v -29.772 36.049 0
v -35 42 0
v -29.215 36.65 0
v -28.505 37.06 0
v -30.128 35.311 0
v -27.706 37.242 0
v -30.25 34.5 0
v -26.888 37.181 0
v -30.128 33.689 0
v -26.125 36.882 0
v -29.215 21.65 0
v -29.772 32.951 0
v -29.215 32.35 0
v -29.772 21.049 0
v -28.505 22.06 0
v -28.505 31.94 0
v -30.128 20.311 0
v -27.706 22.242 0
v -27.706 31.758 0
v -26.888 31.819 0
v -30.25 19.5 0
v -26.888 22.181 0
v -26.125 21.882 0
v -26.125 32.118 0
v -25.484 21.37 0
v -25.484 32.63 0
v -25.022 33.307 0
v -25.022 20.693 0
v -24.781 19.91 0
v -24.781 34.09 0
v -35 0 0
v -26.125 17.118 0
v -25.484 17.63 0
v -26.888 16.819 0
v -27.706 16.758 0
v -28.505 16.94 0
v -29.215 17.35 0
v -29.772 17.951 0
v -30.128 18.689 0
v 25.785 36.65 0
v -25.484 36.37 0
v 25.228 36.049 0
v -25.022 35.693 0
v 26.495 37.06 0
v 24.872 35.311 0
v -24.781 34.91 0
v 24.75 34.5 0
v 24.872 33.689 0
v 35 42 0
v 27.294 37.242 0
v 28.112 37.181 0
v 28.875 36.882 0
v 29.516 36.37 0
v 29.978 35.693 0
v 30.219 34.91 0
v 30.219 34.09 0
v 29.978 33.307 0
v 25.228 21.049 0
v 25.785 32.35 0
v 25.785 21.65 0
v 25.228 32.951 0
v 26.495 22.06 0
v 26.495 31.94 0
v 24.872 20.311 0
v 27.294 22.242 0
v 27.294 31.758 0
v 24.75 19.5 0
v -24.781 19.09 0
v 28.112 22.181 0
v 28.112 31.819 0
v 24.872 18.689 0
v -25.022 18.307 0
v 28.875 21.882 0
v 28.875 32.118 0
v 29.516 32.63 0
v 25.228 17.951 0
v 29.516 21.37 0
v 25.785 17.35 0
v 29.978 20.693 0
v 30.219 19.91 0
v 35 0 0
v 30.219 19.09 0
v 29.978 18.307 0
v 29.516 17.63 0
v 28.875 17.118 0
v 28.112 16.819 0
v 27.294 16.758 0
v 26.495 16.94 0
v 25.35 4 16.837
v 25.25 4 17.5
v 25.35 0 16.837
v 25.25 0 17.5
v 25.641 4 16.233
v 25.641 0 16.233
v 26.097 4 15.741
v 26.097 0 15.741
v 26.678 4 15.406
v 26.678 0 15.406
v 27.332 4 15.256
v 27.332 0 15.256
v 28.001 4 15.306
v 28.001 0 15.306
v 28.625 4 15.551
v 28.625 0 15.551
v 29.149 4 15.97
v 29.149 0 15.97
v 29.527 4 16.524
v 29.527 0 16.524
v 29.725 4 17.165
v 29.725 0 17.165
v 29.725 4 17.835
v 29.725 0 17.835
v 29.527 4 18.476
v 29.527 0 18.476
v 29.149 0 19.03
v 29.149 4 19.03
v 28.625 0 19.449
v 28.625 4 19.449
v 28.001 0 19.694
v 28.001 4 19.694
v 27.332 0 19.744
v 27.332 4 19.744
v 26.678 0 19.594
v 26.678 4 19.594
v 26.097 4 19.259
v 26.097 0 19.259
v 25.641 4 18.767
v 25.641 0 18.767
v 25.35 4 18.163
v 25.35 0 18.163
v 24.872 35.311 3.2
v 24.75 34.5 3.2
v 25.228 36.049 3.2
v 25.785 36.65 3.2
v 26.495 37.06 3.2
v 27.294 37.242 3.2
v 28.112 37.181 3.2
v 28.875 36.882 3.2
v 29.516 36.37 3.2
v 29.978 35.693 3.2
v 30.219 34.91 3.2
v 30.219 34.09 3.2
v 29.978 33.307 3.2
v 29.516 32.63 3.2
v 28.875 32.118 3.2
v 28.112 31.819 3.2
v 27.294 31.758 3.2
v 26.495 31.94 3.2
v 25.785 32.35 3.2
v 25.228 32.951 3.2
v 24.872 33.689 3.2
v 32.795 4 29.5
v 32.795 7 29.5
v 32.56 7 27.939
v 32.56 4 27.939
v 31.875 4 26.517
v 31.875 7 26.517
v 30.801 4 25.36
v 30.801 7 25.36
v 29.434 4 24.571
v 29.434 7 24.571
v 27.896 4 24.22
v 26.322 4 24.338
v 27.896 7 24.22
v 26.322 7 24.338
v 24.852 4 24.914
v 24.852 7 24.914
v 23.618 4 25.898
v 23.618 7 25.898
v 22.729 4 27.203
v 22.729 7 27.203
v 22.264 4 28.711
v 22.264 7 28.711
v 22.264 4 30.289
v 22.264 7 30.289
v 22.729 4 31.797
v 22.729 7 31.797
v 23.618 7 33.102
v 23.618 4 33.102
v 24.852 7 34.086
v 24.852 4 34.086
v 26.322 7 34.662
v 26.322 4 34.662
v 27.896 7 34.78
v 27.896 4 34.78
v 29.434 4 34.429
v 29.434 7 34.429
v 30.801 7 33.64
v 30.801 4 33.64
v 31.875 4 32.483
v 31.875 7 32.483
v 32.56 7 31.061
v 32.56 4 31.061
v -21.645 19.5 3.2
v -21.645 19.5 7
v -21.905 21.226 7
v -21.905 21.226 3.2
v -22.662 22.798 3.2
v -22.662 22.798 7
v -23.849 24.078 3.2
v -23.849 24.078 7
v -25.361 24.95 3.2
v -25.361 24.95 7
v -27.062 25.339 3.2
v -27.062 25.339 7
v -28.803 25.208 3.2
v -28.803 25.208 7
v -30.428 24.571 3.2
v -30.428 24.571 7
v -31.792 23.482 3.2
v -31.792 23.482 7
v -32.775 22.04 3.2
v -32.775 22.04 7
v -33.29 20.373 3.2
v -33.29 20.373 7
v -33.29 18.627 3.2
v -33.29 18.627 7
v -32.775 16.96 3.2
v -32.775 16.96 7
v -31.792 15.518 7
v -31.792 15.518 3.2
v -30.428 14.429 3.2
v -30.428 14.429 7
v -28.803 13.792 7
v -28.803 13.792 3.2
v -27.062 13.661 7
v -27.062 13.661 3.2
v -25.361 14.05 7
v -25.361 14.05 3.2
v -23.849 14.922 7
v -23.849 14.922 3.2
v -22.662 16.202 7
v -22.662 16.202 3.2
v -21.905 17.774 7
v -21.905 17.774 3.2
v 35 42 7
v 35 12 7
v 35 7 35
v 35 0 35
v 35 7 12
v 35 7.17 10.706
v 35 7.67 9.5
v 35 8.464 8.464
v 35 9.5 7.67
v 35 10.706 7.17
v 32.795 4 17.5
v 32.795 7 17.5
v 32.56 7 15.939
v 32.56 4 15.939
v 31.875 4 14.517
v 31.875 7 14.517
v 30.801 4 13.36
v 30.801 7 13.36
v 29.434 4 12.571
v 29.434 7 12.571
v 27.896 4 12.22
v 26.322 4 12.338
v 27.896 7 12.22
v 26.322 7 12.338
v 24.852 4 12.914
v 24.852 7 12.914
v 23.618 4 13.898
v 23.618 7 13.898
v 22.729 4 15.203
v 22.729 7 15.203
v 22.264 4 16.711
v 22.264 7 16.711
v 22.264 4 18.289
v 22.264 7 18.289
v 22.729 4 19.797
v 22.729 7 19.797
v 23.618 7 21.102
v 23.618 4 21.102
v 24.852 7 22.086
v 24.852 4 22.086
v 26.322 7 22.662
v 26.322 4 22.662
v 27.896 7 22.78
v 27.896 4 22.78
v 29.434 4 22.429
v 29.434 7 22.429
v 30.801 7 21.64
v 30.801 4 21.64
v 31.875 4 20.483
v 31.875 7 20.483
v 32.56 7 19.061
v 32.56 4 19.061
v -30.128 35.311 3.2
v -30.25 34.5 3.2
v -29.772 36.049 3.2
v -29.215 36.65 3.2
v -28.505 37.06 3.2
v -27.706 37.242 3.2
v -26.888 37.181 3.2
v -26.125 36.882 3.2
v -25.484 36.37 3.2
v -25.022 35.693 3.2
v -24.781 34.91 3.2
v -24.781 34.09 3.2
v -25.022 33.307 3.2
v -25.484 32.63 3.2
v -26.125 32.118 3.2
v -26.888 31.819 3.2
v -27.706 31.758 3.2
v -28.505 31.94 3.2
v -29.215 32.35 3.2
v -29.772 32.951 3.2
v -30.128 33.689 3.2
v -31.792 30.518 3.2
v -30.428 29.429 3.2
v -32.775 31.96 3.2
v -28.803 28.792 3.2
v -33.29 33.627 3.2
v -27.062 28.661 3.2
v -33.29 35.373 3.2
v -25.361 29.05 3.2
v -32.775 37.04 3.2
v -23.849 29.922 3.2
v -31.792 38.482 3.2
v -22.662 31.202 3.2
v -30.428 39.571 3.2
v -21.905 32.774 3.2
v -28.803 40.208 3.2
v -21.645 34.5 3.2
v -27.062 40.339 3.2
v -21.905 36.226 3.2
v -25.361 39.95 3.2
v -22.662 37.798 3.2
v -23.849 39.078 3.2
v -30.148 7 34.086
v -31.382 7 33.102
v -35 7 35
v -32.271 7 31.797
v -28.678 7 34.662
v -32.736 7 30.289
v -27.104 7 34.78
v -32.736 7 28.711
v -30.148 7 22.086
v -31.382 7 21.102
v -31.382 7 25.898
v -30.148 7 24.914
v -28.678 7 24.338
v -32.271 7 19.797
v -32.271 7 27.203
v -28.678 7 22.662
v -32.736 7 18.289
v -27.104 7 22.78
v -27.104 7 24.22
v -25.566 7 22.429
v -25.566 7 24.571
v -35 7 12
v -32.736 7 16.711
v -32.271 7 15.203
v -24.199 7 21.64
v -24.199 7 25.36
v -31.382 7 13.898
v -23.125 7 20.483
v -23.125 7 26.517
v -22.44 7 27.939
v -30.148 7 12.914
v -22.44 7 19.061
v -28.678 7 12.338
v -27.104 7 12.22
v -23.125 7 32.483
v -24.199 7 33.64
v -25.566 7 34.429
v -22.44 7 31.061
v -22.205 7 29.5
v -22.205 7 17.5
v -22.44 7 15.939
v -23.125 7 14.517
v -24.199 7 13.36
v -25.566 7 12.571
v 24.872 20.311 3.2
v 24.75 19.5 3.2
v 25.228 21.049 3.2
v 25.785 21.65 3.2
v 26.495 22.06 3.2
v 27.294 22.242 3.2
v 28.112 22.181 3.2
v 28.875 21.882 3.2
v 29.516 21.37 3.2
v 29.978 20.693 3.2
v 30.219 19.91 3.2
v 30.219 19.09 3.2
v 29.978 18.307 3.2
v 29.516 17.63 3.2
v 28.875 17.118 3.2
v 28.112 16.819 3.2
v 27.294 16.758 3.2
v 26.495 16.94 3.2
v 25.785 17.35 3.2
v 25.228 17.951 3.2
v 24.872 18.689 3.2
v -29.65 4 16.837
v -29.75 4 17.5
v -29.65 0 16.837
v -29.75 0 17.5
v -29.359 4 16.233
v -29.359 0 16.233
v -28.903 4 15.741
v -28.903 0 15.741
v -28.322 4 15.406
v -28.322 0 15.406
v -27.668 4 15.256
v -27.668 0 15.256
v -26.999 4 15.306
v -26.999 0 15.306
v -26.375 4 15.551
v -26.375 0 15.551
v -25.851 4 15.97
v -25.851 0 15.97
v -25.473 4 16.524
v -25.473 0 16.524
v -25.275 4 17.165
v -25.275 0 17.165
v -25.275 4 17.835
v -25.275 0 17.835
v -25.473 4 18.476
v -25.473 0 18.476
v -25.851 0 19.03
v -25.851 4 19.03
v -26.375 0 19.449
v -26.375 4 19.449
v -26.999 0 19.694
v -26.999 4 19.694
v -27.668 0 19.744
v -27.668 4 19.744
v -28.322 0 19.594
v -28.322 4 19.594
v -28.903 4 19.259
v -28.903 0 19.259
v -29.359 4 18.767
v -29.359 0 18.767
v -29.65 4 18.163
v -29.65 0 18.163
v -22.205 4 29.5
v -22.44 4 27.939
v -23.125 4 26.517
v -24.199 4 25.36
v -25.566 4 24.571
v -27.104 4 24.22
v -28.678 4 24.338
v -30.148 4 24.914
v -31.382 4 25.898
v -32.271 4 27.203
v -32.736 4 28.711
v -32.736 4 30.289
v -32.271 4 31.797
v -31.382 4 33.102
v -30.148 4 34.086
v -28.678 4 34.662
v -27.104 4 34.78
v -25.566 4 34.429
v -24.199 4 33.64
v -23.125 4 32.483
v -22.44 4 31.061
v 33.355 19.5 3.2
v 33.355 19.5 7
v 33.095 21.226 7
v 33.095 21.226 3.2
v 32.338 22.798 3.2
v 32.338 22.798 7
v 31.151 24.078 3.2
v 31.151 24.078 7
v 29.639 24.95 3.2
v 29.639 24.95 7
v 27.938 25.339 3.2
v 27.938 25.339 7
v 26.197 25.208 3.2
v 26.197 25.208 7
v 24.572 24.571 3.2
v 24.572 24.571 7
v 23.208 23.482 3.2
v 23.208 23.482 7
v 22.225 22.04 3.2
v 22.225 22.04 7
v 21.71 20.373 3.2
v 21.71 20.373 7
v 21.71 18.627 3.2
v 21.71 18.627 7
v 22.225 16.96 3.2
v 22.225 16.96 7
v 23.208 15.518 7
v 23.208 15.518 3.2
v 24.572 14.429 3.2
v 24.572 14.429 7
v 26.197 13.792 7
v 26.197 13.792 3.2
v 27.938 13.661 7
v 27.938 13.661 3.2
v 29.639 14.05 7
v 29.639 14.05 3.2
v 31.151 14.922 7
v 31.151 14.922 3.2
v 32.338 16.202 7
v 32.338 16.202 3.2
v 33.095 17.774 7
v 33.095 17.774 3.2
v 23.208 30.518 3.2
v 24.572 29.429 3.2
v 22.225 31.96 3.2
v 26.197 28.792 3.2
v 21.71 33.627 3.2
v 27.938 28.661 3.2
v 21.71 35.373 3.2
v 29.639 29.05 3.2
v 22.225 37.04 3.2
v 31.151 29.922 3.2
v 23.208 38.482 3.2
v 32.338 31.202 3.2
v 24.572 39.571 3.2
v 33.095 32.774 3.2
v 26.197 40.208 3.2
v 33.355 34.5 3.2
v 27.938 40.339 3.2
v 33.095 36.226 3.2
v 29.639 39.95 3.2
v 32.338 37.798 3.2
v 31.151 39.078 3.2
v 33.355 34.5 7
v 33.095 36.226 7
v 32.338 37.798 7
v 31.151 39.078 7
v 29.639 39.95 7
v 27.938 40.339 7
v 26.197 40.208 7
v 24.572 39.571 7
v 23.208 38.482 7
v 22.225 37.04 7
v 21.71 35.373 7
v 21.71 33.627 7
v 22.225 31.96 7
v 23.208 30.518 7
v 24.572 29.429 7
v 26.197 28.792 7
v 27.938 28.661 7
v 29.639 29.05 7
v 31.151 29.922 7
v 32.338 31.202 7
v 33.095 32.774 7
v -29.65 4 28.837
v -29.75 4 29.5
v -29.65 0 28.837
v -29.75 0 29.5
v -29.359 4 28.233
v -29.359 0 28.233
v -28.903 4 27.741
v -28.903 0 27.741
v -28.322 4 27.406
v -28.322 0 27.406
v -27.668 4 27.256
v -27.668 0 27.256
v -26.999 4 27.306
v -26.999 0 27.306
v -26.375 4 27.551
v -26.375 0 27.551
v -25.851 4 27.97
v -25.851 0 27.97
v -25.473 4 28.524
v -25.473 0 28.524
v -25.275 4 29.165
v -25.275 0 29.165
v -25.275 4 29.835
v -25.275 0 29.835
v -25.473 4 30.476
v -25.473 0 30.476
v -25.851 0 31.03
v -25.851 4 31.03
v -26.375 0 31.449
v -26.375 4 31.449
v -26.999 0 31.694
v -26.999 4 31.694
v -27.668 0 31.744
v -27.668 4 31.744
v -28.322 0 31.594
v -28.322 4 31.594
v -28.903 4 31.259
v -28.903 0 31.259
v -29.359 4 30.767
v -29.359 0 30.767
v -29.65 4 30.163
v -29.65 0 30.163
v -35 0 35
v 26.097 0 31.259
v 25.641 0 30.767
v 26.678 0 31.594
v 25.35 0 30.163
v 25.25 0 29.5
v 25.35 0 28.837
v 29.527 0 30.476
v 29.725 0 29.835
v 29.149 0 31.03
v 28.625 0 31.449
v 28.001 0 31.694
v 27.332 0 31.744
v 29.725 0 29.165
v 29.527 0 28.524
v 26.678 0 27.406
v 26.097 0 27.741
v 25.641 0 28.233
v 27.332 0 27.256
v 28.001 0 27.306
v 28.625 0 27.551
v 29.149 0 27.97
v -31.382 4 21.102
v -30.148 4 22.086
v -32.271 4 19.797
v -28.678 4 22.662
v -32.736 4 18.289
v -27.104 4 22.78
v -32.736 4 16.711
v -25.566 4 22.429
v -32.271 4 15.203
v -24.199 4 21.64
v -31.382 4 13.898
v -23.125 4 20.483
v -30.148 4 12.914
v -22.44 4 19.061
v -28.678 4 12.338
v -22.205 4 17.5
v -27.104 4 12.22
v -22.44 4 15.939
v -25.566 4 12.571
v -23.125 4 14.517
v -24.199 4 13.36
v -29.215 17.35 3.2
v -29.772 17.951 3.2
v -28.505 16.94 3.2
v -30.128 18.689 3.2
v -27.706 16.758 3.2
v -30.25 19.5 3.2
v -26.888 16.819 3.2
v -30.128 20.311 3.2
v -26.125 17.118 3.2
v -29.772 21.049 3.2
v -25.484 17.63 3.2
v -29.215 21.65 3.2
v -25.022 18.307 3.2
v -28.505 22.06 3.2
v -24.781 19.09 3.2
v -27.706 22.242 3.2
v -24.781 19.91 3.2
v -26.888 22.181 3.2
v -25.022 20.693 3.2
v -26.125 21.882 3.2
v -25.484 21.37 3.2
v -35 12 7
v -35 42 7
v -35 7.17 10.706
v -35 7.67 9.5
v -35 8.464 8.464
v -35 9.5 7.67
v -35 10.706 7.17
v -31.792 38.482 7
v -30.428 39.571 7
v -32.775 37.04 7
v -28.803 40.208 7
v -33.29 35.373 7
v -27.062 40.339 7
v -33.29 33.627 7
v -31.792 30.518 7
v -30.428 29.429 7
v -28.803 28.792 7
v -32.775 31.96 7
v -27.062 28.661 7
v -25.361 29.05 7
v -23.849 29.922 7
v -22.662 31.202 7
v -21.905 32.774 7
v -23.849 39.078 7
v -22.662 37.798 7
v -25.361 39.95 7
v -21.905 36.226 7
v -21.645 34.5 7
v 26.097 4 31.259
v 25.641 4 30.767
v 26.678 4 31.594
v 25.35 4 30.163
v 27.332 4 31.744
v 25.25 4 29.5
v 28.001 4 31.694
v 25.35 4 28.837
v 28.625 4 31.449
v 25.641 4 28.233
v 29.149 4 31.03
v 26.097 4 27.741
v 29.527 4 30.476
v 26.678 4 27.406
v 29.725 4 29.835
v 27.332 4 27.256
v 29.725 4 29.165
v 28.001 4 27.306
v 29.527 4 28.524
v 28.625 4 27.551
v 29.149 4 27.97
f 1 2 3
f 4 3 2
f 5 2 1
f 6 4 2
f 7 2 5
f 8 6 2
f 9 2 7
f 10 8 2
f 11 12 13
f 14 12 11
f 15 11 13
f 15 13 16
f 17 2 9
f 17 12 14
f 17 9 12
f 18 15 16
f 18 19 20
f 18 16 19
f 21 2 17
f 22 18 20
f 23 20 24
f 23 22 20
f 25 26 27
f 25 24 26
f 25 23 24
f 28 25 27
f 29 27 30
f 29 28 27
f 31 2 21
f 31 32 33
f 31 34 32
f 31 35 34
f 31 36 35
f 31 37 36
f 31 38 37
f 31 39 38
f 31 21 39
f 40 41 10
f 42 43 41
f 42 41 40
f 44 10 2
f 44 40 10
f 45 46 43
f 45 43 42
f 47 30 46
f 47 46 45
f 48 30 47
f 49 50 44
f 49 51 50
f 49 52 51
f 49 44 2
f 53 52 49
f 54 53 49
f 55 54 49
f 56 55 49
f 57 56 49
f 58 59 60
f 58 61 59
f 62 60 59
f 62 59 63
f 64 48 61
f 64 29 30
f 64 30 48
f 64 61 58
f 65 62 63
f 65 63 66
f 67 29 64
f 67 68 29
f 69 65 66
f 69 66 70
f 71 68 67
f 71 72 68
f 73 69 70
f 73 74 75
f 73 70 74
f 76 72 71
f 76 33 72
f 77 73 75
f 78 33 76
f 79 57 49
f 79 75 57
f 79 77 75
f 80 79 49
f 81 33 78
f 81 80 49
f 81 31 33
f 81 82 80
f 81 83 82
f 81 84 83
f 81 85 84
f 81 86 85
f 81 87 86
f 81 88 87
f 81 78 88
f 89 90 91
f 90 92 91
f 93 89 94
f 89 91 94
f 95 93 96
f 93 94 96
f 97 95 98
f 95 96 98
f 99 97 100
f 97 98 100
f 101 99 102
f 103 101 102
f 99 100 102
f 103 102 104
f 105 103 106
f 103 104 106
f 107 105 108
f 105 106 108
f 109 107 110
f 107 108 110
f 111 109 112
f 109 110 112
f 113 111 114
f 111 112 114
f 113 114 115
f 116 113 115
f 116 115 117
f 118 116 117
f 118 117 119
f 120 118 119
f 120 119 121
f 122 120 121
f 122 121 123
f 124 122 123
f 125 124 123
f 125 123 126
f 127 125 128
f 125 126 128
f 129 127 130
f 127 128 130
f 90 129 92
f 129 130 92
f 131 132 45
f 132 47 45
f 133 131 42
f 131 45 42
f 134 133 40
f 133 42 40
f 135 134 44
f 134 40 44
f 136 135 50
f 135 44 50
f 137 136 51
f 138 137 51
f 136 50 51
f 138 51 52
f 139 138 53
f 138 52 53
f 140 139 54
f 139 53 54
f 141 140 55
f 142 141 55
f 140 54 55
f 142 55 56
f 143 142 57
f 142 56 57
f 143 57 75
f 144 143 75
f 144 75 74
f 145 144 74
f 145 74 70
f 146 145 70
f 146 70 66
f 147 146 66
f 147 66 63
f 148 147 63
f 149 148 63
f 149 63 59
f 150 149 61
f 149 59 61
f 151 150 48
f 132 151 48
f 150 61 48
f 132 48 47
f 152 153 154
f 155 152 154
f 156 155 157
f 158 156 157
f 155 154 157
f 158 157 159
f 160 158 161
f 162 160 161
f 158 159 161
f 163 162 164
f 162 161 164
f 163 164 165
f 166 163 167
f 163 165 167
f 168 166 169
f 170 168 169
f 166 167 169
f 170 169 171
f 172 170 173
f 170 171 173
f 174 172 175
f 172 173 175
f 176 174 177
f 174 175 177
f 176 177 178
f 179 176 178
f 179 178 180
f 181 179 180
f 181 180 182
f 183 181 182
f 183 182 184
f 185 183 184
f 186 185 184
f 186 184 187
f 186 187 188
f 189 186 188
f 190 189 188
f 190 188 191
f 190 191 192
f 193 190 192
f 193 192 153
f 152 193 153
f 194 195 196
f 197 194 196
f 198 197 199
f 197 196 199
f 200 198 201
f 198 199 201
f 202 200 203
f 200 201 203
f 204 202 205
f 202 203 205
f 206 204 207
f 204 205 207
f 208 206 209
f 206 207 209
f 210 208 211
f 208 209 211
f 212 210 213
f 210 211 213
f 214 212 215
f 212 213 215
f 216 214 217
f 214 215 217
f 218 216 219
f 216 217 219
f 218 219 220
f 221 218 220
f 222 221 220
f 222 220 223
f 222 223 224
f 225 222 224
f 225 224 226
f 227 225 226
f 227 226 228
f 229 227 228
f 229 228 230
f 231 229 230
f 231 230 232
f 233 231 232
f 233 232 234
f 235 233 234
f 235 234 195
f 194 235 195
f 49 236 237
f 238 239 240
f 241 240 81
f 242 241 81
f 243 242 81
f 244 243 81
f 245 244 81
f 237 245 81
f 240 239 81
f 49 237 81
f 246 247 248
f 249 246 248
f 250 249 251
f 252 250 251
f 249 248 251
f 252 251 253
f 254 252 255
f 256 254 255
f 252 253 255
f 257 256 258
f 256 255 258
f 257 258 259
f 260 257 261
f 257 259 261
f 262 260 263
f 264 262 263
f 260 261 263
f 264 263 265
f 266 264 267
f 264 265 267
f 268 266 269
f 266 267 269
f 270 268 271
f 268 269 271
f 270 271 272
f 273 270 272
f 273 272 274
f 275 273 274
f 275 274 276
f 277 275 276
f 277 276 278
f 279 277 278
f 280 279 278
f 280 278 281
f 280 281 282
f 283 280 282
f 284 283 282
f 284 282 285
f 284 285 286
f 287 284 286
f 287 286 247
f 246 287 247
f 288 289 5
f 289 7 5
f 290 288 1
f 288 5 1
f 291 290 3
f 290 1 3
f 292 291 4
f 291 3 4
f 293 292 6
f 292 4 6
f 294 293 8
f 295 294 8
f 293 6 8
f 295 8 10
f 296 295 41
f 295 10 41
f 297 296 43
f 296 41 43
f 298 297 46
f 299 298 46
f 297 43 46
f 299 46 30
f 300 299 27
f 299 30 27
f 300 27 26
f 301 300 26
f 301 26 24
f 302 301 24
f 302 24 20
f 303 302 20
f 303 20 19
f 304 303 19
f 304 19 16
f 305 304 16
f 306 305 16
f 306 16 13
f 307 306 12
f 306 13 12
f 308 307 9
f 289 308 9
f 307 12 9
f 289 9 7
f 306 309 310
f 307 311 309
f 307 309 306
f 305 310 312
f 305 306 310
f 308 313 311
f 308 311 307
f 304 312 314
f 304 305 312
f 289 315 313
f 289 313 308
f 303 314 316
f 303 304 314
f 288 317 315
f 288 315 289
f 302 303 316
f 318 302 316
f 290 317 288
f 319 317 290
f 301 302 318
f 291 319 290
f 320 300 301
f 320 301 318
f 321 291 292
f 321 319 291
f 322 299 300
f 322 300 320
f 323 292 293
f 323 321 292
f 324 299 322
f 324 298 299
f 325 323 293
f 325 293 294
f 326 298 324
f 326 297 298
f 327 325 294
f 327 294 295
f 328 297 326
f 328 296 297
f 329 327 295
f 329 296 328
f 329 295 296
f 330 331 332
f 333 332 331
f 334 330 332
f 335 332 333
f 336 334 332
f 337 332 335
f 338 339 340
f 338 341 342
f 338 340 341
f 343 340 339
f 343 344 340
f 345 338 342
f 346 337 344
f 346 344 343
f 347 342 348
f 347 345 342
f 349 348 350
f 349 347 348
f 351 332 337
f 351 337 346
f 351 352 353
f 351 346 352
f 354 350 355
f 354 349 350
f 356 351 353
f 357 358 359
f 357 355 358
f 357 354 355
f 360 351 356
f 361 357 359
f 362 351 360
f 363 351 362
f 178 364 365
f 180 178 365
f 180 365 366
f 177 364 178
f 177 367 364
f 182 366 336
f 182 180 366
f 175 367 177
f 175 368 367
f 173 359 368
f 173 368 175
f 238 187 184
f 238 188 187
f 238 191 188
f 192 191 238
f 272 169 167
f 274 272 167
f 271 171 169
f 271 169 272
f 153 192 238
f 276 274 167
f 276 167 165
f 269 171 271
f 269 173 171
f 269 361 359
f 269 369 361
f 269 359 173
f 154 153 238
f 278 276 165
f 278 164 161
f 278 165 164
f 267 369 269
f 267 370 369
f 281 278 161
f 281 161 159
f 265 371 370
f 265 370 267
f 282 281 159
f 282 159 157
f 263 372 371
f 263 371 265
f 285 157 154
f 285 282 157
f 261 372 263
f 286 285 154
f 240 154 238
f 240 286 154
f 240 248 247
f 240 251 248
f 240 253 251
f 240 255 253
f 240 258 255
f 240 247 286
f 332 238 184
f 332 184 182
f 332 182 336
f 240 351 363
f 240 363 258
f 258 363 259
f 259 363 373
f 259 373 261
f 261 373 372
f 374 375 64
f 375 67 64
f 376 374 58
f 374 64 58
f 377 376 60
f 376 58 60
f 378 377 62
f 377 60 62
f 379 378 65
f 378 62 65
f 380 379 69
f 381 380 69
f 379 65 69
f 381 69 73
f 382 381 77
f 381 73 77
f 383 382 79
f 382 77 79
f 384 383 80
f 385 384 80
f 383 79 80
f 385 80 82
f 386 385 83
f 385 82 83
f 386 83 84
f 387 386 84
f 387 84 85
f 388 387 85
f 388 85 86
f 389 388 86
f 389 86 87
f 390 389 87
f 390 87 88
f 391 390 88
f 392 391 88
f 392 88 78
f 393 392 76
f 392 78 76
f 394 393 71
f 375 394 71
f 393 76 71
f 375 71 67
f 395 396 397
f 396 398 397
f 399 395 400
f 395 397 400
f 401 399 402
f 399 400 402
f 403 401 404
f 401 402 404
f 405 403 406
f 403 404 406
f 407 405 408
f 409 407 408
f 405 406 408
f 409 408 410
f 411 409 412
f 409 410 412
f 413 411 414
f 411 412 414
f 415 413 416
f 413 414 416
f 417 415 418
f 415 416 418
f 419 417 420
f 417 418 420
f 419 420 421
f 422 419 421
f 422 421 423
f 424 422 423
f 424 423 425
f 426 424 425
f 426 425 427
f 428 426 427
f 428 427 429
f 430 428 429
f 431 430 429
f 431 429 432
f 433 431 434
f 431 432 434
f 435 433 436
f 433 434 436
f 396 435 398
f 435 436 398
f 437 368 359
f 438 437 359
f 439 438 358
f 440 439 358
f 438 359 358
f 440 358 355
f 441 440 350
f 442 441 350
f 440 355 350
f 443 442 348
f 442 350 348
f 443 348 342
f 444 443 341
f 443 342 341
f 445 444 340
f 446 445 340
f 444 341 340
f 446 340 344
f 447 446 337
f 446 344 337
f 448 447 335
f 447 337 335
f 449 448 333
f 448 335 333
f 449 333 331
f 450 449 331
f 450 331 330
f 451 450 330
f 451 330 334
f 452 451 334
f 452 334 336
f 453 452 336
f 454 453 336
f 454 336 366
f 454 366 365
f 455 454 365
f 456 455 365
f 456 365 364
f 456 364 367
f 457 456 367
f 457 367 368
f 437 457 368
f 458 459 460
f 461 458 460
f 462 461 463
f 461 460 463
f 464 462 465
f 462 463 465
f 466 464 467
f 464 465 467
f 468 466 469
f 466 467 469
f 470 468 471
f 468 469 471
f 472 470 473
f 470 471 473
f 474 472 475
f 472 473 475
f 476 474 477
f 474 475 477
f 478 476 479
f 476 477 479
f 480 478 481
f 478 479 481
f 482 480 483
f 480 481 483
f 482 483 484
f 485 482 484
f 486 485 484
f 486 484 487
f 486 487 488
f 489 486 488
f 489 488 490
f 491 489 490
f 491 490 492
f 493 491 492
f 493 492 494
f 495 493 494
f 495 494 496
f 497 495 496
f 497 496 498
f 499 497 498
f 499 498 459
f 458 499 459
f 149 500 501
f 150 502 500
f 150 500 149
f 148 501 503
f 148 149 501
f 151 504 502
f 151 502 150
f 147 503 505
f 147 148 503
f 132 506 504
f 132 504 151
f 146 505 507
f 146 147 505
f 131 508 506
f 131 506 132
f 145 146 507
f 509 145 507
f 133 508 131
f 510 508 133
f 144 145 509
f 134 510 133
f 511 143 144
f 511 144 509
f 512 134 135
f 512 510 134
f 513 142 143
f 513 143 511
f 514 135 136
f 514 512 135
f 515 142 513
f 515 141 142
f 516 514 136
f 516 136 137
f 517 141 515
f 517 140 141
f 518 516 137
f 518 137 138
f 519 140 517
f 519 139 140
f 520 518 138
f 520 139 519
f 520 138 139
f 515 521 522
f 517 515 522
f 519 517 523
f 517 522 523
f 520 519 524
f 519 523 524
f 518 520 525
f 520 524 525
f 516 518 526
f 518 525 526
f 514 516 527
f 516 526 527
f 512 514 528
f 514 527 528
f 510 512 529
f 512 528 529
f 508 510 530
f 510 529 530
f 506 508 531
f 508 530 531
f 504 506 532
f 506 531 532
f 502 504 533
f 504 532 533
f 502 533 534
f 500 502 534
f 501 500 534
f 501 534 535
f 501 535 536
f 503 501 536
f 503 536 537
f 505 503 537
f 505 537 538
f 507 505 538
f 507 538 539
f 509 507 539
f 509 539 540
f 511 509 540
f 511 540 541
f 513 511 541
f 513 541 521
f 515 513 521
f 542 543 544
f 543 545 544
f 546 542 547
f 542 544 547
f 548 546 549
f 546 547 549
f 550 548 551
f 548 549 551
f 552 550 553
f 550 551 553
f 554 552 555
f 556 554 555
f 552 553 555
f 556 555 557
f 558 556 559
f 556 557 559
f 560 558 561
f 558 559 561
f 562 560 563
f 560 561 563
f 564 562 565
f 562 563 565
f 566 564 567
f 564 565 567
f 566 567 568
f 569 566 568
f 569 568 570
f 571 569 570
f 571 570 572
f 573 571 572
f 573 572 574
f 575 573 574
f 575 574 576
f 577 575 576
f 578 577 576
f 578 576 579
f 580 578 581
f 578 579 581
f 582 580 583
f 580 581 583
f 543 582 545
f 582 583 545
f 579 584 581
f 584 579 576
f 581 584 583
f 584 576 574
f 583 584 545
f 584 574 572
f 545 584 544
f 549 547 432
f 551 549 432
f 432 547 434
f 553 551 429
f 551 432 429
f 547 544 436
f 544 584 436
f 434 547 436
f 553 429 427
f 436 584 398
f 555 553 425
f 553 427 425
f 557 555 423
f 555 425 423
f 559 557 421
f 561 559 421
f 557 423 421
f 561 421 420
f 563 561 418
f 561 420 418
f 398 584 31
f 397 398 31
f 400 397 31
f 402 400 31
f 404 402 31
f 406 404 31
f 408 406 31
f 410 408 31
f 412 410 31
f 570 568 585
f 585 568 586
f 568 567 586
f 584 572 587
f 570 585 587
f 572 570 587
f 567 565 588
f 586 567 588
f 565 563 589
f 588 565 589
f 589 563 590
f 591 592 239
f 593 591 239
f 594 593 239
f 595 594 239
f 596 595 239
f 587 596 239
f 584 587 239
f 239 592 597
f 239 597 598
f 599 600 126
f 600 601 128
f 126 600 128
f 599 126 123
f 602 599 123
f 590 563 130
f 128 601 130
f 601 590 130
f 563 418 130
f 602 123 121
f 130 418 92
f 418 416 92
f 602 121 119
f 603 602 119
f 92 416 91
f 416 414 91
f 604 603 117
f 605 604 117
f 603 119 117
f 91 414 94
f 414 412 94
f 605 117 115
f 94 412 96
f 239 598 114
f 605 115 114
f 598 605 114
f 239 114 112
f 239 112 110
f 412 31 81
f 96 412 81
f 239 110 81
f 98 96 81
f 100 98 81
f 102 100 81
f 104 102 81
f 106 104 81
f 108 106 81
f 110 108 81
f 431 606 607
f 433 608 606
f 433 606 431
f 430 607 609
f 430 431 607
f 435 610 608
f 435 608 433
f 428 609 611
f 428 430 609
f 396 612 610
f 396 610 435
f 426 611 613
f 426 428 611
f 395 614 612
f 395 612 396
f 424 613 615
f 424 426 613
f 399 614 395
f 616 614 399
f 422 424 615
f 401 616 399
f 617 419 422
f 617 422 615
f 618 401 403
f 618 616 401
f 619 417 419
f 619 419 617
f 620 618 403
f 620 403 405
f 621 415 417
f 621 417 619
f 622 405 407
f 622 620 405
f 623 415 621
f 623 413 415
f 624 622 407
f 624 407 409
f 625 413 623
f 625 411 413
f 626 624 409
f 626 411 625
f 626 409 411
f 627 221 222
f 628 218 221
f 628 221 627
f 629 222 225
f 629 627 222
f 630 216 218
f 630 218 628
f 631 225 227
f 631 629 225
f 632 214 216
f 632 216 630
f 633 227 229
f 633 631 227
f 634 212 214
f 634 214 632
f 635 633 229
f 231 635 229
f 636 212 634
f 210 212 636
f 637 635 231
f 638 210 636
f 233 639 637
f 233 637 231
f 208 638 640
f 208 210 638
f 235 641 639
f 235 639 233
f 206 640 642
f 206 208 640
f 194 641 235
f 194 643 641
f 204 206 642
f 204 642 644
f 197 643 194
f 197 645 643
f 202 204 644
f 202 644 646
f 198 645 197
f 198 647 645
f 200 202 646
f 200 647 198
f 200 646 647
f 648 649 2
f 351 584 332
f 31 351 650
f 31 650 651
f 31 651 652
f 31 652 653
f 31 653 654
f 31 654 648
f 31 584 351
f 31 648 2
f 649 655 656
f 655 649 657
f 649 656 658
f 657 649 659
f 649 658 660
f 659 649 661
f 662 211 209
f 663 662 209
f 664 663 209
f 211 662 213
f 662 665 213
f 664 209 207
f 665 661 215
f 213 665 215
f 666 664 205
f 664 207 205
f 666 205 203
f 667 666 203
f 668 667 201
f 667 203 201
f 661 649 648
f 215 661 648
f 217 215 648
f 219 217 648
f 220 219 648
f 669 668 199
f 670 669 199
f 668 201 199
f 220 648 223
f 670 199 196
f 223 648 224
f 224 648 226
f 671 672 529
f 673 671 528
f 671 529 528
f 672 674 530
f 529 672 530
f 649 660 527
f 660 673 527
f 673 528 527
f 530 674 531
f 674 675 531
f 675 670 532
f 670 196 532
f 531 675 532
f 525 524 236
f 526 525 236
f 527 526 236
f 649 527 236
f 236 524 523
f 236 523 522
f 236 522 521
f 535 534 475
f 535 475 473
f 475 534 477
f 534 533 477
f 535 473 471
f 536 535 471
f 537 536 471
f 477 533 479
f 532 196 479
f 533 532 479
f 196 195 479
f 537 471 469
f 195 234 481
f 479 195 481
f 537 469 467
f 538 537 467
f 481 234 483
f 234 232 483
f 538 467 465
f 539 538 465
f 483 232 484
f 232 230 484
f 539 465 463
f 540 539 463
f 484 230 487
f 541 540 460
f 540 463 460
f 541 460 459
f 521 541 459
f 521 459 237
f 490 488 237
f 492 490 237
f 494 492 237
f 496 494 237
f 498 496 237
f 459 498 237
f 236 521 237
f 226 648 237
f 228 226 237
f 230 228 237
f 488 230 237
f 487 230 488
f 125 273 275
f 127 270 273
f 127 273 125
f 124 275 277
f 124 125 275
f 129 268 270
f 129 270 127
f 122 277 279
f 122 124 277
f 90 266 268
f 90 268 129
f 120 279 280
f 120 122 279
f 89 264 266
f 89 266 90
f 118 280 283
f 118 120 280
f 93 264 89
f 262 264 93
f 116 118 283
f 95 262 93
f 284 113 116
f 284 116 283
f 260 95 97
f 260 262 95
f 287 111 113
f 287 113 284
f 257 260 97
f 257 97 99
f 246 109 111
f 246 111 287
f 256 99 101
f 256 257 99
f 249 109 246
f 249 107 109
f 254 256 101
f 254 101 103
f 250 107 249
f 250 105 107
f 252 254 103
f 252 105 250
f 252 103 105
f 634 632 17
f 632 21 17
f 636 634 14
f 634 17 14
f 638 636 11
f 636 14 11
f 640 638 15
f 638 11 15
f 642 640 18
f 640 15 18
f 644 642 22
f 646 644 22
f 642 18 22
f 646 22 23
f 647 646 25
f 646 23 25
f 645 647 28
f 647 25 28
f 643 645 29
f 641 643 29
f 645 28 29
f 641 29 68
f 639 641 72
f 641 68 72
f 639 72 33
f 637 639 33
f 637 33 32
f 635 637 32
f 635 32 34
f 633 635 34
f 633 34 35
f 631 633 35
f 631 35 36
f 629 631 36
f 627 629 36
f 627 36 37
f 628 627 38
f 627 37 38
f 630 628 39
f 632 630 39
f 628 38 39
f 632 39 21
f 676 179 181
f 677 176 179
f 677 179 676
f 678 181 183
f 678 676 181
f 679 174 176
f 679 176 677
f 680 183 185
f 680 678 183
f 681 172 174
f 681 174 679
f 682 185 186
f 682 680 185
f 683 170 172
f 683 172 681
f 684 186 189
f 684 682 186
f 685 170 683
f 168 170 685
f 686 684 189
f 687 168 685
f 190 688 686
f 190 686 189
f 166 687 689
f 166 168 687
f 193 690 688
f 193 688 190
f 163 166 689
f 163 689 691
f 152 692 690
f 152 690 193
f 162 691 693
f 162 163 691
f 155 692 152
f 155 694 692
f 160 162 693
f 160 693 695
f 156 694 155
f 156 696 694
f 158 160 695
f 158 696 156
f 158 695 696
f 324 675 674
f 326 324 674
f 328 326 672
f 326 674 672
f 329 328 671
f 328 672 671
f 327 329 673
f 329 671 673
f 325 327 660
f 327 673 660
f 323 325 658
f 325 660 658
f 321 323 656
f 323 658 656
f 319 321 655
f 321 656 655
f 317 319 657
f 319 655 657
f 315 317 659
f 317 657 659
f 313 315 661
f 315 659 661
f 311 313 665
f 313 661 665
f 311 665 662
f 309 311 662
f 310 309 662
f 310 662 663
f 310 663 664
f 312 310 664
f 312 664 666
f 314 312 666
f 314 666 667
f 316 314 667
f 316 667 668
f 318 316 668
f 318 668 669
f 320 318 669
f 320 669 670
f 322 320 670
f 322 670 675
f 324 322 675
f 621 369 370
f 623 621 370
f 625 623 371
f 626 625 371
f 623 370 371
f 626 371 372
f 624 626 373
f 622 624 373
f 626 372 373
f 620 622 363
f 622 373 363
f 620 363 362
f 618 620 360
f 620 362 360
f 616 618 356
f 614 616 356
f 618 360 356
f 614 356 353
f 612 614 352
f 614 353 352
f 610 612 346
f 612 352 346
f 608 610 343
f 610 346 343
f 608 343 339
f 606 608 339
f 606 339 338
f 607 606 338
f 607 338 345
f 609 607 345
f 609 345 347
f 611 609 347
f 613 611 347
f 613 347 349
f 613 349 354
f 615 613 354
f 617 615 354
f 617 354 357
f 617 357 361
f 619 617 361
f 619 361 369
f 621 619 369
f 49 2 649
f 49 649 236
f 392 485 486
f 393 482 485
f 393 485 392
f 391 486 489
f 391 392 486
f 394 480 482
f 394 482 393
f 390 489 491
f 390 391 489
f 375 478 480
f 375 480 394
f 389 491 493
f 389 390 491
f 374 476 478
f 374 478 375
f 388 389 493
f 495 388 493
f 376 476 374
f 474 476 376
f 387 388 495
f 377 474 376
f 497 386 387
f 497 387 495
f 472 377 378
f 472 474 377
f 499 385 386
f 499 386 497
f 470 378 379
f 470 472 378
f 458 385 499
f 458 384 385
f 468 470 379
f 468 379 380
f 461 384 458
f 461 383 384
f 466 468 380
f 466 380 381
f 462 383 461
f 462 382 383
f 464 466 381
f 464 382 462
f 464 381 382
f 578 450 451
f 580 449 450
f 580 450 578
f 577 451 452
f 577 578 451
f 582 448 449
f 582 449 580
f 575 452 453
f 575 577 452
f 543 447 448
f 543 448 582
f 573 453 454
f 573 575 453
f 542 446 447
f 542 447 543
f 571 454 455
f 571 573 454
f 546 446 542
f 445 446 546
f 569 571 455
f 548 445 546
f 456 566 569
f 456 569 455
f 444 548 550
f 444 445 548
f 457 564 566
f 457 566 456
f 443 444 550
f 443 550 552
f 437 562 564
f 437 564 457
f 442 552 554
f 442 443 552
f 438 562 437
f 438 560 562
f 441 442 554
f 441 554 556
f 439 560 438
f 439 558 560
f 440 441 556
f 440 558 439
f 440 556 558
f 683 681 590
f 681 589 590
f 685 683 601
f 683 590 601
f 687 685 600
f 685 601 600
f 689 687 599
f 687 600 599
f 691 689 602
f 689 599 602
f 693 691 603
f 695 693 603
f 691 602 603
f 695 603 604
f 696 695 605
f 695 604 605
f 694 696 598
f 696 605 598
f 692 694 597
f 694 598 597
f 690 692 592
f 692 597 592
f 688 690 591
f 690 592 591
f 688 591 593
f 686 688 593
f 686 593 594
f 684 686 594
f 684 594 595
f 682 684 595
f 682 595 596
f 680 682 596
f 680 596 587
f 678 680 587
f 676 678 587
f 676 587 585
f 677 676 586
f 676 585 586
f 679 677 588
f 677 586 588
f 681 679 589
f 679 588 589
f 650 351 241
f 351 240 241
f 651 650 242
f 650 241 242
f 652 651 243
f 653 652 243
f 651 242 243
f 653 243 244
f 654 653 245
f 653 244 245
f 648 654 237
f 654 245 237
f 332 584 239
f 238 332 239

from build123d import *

# Parameters (mm, degrees)
SKETCH1_W                                        = 70
SKETCH1_H                                        = 35
BOSS_EXTRUDE1_DEPTH                              = 7
SKETCH2_W                                        = 70
SKETCH2_H                                        = 7
BOSS_EXTRUDE2_DEPTH                              = 35
FILLET1_R                                        = 5
CBORE_FOR_M5_HEX_HEAD_MACHINE_SCREW1_D           = 5.5
CBORE_FOR_M5_HEX_HEAD_MACHINE_SCREW1_CBORE_D     = 11.71
CBORE_FOR_M5_HEX_HEAD_MACHINE_SCREW1_CBORE_DEPTH = 3.8
CBORE_FOR_M4_HEX_HEAD_MACHINE_SCREW2_D           = 4.5
CBORE_FOR_M4_HEX_HEAD_MACHINE_SCREW2_CBORE_D     = 10.59
CBORE_FOR_M4_HEX_HEAD_MACHINE_SCREW2_CBORE_DEPTH = 3


with BuildPart() as part:
    # Sketch1 → Boss-Extrude1 (new body)
    with BuildSketch(Plane(origin=(0, 0, 0), x_dir=(1, 0, 0), z_dir=(0, 1, 0))):
        with Locations((0, -17.5)):
            Rectangle(SKETCH1_W, SKETCH1_H)
    extrude(amount=BOSS_EXTRUDE1_DEPTH)

    # Sketch2 → Boss-Extrude2 (add)
    with BuildSketch(Plane(origin=(0, 7, 0), x_dir=(1, 0, 0), z_dir=(0, 1, 0))):
        with Locations((0, -3.5)):
            Rectangle(SKETCH2_W, SKETCH2_H)
    extrude(amount=BOSS_EXTRUDE2_DEPTH)

    # Fillet1
    fillet1_edges = [part.edges().sort_by_distance(p)[0] for p in [
        (0, 7, 7),
    ]]
    fillet(fillet1_edges, radius=FILLET1_R)

    # CBORE for M5 Hex Head Machine Screw1 (through all)
    with Locations(Plane.XY.offset(7)):
        with Locations((-27.5, 34.5), (27.5, 34.5), (27.5, 19.5), (-27.5, 19.5)):
            CounterBoreHole(CBORE_FOR_M5_HEX_HEAD_MACHINE_SCREW1_D / 2, CBORE_FOR_M5_HEX_HEAD_MACHINE_SCREW1_CBORE_D / 2, CBORE_FOR_M5_HEX_HEAD_MACHINE_SCREW1_CBORE_DEPTH)

    # CBORE for M4 Hex Head Machine Screw2 (through all)
    with Locations(Plane(origin=(0, 7, 0), x_dir=(1, 0, 0), z_dir=(0, 1, 0))):
        with Locations((-27.5, -17.5), (-27.5, -29.5), (27.5, -17.5), (27.5, -29.5)):
            CounterBoreHole(CBORE_FOR_M4_HEX_HEAD_MACHINE_SCREW2_D / 2, CBORE_FOR_M4_HEX_HEAD_MACHINE_SCREW2_CBORE_D / 2, CBORE_FOR_M4_HEX_HEAD_MACHINE_SCREW2_CBORE_DEPTH)


solid = part.part
